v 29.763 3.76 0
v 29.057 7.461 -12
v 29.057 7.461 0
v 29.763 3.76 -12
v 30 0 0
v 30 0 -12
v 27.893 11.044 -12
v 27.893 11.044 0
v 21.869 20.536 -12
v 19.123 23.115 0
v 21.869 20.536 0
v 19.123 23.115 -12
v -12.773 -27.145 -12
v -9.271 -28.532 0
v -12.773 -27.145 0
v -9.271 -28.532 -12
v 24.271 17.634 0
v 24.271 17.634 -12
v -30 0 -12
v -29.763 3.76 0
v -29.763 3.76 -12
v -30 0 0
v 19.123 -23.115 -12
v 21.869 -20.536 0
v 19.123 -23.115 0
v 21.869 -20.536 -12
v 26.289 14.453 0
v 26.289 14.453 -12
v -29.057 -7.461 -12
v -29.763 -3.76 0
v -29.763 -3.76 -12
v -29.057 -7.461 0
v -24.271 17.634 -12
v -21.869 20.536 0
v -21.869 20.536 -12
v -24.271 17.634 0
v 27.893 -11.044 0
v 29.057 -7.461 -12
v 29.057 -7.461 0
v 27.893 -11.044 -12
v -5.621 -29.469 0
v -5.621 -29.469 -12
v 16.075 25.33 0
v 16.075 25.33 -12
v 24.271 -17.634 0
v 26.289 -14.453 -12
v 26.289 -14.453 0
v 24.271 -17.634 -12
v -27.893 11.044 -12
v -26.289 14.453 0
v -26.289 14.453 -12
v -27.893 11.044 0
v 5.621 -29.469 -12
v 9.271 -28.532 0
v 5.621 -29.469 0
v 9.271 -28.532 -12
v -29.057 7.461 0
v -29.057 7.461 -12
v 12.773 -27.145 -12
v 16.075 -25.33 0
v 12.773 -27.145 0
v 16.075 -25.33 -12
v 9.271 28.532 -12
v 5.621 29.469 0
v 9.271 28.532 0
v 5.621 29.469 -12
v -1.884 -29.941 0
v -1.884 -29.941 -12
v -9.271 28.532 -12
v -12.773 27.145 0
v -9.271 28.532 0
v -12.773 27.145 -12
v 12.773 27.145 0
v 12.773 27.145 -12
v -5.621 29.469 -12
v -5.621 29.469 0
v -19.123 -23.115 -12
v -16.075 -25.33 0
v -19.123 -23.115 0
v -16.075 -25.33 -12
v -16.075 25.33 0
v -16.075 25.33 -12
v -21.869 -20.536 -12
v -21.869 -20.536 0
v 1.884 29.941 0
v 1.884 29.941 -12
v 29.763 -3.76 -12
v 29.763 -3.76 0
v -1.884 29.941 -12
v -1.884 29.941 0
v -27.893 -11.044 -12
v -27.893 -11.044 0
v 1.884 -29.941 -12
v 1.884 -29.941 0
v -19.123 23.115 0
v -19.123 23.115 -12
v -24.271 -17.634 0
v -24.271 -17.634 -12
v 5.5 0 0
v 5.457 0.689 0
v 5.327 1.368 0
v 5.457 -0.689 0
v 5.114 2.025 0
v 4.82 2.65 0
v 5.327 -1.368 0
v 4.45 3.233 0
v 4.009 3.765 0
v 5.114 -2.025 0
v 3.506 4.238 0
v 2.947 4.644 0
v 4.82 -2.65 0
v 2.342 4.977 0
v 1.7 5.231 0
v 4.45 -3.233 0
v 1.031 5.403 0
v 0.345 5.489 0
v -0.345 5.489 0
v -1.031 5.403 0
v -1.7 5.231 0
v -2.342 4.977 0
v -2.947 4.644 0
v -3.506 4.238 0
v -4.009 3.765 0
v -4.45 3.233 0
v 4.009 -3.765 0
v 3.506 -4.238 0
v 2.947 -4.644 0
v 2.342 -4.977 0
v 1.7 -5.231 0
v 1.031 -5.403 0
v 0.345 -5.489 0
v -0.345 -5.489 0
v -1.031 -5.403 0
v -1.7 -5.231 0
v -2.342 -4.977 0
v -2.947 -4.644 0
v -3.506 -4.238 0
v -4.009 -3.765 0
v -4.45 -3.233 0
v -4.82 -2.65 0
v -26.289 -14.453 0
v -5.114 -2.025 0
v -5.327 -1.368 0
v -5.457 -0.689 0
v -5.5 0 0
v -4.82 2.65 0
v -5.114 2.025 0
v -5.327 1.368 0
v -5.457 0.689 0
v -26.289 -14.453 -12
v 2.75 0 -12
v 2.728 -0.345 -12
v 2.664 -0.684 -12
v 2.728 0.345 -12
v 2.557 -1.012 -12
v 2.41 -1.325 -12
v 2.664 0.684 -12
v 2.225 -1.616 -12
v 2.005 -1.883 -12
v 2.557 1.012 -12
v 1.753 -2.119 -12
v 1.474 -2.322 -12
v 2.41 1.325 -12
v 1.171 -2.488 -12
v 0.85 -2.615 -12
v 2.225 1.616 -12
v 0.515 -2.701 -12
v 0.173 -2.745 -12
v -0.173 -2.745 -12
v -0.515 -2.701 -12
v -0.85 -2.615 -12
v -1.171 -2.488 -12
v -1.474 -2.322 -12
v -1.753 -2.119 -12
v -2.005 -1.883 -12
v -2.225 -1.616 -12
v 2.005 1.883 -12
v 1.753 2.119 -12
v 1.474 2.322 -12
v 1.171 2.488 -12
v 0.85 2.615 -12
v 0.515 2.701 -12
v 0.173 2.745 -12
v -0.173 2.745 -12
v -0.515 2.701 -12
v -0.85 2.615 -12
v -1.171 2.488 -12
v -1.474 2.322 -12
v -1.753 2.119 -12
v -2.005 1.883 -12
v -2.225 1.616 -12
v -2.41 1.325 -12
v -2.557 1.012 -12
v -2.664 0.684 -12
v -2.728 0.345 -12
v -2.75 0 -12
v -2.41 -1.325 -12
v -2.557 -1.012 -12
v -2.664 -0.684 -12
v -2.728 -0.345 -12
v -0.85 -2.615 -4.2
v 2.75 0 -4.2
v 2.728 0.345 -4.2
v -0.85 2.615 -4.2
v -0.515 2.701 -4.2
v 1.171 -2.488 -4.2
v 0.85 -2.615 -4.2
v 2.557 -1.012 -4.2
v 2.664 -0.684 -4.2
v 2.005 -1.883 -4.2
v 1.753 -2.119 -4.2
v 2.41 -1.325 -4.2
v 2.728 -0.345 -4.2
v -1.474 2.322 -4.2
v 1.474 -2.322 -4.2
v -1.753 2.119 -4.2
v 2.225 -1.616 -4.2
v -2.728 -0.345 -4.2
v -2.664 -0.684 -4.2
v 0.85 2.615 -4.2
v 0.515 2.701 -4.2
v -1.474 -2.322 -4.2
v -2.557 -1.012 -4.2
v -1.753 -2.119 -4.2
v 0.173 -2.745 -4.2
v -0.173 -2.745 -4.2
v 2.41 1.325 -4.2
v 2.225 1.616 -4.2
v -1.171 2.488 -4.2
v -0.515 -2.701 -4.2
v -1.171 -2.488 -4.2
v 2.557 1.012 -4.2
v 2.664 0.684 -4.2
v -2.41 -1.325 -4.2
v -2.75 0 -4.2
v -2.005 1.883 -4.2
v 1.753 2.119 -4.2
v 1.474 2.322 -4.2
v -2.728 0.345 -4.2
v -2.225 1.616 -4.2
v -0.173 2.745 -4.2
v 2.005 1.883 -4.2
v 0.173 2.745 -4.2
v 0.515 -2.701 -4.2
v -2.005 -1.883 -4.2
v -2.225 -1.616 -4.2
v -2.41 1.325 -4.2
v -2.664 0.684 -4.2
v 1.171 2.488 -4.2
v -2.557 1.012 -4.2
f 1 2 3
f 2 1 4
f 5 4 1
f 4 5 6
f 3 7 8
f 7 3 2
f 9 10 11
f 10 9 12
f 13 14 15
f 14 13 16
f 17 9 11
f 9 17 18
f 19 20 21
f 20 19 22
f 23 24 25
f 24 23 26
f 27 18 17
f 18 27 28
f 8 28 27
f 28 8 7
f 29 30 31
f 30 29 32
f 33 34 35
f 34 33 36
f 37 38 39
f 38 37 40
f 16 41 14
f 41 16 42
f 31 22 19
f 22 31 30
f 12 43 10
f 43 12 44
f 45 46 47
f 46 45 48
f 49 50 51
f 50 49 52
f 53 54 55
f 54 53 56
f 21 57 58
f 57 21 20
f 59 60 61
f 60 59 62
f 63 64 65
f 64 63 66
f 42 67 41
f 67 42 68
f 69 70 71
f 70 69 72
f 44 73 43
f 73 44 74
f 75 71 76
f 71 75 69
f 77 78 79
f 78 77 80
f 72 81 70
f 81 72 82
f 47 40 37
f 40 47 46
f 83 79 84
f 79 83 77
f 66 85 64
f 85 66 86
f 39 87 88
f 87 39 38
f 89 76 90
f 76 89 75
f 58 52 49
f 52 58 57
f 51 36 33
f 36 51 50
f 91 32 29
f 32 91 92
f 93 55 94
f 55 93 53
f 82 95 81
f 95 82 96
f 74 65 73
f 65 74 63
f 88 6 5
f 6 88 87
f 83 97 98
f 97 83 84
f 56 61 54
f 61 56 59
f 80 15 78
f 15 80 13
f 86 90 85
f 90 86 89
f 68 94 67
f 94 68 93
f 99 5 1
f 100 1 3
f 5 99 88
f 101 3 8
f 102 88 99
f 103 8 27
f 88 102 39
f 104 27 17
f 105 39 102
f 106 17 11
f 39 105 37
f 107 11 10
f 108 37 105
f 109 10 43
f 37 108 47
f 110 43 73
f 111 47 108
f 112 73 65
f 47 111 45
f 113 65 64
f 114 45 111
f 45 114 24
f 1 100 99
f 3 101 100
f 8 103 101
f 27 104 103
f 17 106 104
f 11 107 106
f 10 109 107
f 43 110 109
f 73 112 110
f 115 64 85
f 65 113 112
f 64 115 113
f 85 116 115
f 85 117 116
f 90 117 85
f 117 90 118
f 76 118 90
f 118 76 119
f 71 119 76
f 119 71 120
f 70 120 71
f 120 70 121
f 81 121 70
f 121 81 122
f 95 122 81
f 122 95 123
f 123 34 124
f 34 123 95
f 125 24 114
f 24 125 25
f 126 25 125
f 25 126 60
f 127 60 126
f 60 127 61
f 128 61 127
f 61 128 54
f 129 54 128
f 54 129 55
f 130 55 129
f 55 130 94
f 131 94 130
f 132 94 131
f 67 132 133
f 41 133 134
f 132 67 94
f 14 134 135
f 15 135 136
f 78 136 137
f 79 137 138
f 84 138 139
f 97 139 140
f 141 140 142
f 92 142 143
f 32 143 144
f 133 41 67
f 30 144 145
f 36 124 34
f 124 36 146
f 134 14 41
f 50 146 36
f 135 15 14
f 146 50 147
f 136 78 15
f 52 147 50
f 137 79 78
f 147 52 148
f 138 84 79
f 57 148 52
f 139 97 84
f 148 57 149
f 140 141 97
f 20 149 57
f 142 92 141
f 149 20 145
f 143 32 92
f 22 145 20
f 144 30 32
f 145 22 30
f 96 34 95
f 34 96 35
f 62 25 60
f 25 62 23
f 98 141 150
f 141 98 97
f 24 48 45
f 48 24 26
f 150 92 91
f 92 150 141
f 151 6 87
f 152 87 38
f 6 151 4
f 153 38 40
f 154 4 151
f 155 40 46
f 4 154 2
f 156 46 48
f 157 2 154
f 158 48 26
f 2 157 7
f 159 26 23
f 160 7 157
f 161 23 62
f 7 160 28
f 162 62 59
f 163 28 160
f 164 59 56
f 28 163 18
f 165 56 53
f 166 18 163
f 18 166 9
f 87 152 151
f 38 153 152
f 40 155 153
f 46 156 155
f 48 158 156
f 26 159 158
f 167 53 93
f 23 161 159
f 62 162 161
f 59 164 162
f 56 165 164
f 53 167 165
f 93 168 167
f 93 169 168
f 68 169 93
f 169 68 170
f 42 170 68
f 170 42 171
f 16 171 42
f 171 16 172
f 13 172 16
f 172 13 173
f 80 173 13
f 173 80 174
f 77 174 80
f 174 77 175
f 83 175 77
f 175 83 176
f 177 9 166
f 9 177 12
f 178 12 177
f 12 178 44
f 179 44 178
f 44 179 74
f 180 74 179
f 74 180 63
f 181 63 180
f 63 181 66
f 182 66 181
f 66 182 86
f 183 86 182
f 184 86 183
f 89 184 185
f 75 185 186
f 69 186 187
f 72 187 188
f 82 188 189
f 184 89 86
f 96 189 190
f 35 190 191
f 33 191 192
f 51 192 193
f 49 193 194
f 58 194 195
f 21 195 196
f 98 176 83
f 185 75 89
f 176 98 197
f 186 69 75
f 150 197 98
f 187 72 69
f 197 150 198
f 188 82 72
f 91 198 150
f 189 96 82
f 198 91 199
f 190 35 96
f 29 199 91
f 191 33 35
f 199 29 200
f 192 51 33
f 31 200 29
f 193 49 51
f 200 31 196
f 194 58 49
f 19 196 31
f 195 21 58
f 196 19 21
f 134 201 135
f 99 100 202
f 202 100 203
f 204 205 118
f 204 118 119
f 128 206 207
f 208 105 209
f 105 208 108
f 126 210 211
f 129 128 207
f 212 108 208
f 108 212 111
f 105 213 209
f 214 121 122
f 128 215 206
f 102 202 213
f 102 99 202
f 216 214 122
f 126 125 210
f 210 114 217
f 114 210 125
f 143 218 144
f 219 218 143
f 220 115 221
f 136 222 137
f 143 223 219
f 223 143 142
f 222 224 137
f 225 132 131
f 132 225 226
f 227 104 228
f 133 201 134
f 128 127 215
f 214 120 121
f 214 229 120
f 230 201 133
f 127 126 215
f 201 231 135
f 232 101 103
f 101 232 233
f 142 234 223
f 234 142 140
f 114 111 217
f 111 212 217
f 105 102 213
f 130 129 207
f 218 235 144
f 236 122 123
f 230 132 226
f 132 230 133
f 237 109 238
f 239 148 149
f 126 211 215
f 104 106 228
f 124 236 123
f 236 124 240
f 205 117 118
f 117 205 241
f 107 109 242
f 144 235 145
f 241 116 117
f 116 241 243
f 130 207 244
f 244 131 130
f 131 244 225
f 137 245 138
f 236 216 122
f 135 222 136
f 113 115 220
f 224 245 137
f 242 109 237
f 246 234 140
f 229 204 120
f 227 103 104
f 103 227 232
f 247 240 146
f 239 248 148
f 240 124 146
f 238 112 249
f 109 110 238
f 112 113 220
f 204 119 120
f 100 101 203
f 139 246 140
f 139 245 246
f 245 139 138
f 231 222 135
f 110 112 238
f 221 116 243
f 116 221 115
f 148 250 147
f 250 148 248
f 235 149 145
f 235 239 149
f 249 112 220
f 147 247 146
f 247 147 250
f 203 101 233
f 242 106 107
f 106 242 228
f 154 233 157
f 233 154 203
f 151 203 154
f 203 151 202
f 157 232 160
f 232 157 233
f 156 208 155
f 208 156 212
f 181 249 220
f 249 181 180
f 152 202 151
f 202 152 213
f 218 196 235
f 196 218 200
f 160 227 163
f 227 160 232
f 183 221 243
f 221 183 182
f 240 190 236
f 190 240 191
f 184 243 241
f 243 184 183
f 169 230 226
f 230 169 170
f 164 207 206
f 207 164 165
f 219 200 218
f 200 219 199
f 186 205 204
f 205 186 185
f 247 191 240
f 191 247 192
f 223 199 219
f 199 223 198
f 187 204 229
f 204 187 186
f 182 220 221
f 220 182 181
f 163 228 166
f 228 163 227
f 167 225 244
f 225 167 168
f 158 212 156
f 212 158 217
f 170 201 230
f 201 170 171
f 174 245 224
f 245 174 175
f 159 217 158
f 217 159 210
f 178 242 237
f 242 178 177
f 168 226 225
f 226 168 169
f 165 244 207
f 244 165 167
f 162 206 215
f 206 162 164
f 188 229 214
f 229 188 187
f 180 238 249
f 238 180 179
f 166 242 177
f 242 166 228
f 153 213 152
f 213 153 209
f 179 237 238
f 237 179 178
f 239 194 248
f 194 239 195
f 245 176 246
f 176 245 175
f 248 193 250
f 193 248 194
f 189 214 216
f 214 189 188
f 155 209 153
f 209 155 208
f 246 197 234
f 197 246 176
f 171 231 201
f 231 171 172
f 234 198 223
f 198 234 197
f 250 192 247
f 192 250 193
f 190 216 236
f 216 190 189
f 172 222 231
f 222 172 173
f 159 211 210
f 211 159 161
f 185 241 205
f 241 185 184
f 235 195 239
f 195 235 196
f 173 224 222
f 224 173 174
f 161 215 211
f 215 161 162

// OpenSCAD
$fn = 50;


difference() {
	union() {
		translate(v = [0, 0, -12.0000000000]) {
			cylinder(h = 12, r = 30.0000000000);
		}
		translate(v = [0, 0, -12.0000000000]) {
			cylinder(h = 12, r = 2.8750000000);
		}
	}
	union() {
		translate(v = [0, 0, 0]) {
			rotate(a = [0, 0, 0]) {
				difference() {
					union() {
						translate(v = [0, 0, -12.0000000000]) {
							cylinder(h = 12, r = 2.2500000000);
						}
						translate(v = [0, 0, -4.2000000000]) {
							cylinder(h = 4.2000000000, r1 = 2.7500000000, r2 = 5.5000000000);
						}
						translate(v = [0, 0, -12.0000000000]) {
							cylinder(h = 12, r = 2.7500000000);
						}
						translate(v = [0, 0, -12.0000000000]) {
							cylinder(h = 12, r = 2.2500000000);
						}
					}
					union();
				}
			}
		}
	}
}
